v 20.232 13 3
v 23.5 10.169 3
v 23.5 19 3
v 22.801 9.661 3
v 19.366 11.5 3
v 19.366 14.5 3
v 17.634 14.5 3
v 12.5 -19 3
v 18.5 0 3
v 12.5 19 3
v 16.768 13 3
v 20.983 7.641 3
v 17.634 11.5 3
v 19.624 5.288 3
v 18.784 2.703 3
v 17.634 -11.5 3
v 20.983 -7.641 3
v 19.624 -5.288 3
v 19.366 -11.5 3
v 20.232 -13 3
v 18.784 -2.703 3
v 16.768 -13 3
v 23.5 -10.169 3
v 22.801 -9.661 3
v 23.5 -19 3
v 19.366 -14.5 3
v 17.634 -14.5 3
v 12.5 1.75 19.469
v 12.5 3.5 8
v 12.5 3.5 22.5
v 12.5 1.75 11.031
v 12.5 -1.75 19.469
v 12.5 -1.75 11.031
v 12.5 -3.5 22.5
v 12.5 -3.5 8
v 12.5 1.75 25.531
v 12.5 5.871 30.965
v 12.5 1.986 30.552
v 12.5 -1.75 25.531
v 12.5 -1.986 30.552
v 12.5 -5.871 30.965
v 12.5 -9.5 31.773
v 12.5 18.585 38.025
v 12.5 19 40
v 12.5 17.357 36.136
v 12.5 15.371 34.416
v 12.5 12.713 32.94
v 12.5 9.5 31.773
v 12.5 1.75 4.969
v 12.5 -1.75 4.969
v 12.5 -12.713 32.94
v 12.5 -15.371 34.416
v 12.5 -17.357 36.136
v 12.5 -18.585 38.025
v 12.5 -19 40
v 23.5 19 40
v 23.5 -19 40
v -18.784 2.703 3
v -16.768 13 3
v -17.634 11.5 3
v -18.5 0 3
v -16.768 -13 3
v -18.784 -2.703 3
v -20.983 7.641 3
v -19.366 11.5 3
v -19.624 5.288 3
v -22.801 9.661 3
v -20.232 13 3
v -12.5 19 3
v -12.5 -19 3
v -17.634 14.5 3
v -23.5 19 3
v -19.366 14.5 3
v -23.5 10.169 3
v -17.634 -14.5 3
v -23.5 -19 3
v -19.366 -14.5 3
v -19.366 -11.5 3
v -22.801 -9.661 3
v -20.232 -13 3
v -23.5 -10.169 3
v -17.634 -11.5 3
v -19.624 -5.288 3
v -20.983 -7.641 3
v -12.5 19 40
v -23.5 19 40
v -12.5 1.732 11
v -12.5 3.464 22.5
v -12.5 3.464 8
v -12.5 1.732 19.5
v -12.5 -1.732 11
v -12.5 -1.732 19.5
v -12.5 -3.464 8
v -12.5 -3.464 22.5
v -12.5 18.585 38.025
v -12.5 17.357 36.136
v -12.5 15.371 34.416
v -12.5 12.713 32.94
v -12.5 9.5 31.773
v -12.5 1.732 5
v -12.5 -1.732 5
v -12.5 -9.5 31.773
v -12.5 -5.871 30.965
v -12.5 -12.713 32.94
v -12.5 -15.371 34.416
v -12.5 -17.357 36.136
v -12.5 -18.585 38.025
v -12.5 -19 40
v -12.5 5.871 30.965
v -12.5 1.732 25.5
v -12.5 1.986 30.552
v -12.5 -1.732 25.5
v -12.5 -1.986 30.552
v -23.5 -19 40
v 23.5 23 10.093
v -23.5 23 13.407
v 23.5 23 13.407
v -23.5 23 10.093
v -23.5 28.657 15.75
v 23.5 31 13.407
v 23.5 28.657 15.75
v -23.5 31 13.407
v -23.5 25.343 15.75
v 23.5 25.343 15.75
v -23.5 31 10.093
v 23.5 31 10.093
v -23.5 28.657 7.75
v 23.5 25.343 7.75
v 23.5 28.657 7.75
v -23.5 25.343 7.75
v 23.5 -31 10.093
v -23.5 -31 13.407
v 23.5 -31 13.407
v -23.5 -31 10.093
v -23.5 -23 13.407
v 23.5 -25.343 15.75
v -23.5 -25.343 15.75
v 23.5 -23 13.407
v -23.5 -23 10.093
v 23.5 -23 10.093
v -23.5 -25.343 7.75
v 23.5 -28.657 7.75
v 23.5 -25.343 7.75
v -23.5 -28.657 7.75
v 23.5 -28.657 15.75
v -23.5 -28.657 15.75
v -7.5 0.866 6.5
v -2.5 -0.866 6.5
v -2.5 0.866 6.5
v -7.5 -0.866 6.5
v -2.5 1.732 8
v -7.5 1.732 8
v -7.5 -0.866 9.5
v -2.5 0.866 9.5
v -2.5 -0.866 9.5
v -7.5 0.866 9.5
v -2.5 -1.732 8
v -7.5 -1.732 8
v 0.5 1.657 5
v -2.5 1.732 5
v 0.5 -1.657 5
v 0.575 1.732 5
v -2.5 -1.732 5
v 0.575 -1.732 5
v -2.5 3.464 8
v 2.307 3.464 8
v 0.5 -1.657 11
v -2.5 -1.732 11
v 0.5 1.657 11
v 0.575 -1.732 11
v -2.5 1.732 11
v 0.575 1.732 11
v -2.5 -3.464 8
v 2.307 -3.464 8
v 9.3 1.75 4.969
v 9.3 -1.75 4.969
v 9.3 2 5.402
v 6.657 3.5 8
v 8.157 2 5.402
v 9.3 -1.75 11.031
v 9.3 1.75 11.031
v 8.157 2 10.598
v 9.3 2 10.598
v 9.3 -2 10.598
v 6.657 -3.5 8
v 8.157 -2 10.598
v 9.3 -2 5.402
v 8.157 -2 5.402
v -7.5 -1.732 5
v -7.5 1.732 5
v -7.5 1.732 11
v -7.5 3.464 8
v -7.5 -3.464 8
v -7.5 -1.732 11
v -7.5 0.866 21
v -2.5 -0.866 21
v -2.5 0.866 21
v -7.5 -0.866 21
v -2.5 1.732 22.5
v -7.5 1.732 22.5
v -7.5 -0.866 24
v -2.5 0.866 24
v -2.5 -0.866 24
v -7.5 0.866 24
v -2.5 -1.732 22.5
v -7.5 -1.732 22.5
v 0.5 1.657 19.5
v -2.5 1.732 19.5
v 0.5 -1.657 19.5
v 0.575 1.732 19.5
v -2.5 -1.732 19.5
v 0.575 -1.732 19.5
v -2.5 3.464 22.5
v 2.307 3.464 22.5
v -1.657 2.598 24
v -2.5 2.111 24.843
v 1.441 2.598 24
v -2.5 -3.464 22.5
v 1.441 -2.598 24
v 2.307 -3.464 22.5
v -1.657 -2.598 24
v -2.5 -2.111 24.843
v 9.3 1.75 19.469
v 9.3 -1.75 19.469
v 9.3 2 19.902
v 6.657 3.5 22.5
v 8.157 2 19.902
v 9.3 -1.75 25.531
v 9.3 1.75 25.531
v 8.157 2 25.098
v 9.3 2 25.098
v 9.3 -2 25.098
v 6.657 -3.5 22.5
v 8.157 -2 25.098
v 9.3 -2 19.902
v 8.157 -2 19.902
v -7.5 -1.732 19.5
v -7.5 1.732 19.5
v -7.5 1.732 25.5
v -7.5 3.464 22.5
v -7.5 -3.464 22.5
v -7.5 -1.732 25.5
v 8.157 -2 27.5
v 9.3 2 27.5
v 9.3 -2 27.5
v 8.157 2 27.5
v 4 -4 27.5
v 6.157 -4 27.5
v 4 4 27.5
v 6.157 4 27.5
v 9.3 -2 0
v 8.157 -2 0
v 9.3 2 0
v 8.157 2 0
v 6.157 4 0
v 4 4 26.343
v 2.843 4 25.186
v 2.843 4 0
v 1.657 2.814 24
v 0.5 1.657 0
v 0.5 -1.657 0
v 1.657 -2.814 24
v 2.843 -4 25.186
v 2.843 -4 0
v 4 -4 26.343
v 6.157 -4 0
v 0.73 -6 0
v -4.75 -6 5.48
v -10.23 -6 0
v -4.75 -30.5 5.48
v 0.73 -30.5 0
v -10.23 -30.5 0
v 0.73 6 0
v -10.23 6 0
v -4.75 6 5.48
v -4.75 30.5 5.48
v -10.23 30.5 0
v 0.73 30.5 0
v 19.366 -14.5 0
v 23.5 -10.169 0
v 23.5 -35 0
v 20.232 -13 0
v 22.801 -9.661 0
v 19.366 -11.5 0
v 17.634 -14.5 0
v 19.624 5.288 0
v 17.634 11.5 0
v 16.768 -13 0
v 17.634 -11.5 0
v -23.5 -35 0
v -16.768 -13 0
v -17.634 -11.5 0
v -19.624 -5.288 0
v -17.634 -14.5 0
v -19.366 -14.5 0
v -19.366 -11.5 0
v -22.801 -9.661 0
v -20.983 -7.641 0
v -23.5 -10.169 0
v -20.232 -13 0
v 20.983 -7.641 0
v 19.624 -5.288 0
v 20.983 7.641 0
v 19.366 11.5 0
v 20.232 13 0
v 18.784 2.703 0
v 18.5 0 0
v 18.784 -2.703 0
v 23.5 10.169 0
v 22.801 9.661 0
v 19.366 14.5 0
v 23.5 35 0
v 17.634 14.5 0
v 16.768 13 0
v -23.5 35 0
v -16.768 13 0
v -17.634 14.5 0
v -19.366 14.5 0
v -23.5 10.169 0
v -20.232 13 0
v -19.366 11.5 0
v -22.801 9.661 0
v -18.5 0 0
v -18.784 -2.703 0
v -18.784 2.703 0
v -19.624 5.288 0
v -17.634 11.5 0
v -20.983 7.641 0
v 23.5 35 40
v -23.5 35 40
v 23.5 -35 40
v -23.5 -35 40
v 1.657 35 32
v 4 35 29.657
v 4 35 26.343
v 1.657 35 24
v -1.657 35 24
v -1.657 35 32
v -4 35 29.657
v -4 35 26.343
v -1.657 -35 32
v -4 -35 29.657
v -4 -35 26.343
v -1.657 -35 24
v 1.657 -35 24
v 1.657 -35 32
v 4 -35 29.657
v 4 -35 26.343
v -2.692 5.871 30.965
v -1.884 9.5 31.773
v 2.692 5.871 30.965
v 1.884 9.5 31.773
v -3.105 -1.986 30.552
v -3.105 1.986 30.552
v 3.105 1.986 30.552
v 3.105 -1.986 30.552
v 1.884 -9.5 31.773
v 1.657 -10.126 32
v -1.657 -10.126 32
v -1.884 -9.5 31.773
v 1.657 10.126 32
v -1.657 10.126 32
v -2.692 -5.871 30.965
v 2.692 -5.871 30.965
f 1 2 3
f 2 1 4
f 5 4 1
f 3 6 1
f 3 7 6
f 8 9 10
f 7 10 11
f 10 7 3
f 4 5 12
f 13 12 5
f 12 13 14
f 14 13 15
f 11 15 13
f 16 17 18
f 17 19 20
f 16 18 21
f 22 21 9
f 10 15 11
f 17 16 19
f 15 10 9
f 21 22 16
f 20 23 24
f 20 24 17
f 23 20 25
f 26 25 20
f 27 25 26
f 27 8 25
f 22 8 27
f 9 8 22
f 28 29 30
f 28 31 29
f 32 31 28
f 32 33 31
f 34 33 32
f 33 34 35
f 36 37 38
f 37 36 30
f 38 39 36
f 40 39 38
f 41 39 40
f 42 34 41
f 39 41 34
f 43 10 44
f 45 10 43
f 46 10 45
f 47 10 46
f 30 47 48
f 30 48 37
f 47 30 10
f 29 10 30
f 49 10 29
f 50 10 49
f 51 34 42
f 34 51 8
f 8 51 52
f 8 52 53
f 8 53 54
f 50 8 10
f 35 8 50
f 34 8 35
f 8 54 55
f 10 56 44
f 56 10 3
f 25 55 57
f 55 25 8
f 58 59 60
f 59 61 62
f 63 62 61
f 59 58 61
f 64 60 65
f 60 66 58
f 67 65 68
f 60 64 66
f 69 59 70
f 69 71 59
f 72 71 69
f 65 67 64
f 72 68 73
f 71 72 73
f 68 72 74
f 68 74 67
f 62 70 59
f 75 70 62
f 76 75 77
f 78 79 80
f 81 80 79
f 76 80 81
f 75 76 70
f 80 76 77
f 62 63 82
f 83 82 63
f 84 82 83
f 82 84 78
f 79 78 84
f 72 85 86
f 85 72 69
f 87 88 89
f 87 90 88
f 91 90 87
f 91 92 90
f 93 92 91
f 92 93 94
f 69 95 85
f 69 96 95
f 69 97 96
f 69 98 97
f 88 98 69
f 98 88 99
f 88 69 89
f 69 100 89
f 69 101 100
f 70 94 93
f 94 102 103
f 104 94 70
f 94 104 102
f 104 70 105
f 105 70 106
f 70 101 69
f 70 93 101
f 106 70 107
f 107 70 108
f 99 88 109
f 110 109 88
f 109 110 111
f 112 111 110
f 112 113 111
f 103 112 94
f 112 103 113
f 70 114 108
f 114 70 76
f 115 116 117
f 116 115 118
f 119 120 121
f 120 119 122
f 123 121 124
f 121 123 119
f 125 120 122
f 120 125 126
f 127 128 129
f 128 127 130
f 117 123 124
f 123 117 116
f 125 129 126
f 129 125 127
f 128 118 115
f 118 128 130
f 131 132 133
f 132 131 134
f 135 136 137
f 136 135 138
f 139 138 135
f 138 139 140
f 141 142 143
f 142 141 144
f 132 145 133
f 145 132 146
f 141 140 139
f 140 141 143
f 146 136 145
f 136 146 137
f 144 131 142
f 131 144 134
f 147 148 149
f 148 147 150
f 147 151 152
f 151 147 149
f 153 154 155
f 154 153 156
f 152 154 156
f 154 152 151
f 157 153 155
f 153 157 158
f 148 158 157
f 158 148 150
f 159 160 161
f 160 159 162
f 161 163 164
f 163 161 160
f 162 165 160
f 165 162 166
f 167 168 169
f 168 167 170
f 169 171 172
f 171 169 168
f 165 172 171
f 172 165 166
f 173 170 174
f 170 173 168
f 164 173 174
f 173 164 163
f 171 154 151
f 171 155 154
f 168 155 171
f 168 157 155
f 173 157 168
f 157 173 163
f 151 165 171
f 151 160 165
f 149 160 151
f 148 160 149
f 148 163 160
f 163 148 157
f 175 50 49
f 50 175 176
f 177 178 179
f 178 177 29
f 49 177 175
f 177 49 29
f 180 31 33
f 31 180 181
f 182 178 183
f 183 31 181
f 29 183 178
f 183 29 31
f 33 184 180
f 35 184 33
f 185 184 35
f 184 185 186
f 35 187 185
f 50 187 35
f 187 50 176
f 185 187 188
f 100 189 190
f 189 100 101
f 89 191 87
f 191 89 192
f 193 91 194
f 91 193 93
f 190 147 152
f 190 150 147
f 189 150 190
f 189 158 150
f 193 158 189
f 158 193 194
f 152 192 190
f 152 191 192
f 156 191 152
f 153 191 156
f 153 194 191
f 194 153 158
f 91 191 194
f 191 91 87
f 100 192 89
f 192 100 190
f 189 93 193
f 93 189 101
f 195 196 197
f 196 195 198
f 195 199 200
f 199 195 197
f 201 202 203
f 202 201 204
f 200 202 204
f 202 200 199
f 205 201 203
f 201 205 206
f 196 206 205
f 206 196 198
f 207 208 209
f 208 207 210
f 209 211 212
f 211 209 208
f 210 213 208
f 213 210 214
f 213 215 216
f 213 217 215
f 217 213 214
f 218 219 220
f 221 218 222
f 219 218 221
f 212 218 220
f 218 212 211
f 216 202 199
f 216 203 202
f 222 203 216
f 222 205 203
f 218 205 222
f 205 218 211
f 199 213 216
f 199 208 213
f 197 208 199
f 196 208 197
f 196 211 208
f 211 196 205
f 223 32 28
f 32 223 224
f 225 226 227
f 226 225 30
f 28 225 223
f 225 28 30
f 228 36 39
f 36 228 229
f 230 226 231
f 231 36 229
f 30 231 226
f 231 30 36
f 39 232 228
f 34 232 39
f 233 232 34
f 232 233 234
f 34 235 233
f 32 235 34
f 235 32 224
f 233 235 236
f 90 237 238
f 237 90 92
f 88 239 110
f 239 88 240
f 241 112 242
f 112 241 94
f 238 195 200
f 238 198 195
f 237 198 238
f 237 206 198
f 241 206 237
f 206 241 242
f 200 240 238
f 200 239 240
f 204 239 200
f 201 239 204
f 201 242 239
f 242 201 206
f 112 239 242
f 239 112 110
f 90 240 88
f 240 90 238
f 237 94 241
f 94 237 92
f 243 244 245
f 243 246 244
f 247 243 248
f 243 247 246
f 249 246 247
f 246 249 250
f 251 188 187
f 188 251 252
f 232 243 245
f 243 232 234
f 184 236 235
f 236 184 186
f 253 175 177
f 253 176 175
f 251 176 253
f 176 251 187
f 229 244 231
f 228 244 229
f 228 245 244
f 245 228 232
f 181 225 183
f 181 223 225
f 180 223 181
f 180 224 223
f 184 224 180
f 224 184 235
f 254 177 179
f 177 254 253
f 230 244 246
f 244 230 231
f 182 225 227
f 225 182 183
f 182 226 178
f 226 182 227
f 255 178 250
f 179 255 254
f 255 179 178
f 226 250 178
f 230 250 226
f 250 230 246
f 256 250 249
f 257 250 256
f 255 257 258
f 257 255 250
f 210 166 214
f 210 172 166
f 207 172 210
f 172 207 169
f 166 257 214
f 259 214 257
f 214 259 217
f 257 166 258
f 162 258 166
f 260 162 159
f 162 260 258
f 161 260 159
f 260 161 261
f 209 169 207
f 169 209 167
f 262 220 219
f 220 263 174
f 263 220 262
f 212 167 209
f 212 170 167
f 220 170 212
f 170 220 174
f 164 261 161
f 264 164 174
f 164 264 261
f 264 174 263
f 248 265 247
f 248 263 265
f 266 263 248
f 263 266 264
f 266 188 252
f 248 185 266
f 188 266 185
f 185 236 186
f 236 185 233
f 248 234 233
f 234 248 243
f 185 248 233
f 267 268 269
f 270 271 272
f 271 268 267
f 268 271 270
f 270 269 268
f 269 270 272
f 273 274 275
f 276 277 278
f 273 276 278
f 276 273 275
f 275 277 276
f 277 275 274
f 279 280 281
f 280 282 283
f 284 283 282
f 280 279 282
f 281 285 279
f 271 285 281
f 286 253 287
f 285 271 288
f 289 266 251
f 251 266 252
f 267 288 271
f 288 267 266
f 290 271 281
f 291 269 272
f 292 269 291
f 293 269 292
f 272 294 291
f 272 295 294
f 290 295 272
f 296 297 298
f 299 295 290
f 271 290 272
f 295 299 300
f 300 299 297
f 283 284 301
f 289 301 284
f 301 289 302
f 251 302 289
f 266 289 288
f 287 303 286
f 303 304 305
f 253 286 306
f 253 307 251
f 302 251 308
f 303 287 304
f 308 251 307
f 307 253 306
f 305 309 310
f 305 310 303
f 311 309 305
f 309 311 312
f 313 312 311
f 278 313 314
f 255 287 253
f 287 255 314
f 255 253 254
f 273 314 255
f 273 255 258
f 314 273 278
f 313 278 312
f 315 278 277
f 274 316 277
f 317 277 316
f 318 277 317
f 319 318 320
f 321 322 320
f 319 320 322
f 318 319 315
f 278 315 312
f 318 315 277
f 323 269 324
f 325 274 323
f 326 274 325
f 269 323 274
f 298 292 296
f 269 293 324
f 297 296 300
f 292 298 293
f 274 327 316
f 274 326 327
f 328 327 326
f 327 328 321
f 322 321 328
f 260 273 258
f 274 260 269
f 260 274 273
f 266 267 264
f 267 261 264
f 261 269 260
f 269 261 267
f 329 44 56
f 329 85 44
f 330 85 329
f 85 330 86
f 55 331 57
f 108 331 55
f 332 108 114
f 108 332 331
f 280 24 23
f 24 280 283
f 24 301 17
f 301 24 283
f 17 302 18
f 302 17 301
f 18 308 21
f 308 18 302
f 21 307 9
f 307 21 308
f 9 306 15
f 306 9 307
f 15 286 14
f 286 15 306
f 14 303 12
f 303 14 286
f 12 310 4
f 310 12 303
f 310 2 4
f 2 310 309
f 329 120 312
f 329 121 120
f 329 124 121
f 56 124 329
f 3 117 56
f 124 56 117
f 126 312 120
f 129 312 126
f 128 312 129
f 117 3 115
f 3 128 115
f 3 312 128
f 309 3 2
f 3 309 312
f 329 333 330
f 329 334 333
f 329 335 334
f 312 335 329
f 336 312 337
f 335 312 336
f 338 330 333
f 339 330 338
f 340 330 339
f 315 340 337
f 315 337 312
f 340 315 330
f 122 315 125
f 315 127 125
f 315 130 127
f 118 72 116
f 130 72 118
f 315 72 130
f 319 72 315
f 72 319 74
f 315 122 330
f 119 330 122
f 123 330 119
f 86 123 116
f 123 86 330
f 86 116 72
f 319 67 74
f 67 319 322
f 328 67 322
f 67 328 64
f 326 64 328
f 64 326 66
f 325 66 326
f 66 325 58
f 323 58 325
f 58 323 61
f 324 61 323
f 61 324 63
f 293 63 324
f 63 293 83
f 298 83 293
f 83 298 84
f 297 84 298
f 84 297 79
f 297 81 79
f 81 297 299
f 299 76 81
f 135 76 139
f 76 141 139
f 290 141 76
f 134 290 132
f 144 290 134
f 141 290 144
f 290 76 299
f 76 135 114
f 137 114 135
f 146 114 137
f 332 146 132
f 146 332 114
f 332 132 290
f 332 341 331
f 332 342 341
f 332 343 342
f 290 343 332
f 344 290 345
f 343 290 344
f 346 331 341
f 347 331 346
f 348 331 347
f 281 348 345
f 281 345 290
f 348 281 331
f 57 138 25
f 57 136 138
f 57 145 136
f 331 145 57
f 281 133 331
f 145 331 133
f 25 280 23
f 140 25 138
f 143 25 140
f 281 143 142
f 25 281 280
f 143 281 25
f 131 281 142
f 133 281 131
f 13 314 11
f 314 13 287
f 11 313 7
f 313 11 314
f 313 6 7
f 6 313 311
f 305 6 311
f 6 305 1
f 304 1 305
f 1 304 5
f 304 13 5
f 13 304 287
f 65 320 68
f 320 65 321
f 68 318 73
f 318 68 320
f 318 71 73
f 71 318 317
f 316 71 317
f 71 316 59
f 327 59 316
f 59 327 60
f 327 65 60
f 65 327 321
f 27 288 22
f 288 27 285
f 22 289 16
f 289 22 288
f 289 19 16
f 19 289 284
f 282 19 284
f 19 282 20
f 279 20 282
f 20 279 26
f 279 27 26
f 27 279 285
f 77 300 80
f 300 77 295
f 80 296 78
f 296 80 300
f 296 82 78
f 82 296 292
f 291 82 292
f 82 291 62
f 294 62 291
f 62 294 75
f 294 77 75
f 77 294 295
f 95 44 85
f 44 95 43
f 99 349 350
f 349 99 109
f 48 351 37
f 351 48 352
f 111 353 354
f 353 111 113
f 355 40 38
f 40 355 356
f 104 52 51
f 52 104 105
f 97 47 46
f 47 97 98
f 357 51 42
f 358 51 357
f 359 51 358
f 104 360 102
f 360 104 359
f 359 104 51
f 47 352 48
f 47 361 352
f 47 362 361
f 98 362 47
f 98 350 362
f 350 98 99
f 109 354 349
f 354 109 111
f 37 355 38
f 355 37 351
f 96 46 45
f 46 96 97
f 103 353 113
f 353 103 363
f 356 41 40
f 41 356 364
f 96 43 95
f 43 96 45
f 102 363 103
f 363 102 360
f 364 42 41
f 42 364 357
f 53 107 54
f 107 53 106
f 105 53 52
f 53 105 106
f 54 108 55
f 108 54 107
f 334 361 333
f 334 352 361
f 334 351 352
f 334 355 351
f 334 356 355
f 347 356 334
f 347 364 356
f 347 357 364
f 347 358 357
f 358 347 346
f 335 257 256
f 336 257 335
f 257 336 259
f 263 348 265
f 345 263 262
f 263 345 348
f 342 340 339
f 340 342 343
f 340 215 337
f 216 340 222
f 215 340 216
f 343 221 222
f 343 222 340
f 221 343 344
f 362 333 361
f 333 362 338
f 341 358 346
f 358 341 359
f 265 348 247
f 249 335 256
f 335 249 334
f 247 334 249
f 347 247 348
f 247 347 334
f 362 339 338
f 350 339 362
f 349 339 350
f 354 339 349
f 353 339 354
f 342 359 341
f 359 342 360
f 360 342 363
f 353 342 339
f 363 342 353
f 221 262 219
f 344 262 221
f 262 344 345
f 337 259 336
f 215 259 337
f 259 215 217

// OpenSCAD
// file: settings.scad
rod_size = 8;
rod_nut_size = 15; //12 for M6, 15 for M8
bearing_size = 15.5; //12.5 for LM6UU, 15.5 for LM8UU,LM8SUU
bearing_length = 24.5; //19.5 for LM6UU, 17.5 for LM8SUU, 24.5 for LM8UU
yz_motor_distance = 25;
motor_screw_spacing = 26; //26 for NEMA14, 31 for NEMA17
motor_casing = 38; //38 for NEMA14, 45 for NEMA17
end_height = 40; //measure the height of your motor casing and add 4mm. Suggestion: 40 for NEMA14, 55 for NEMA17
bed_mount_height = 16;
//x_rod_spacing = motor_screw_spacing + 3 + rod_size;
x_rod_spacing = 30;
x_carriage_width = 70;
carriage_extruder_offset = 5;
pulley_size = 20;
idler_pulley_width = 10;
gusset_size = 15;
m3_size = 3;
m3_nut_size = 6;
m4_size = 4;
motor_shaft_size = 5;

// ratio for converting diameter to apothem
da6 = 1 / cos(180 / 6) / 2;
da8 = 1 / cos(180 / 8) / 2;
// main file
include <settings.scad>;

!base_end();

module base_end() difference() {
	linear_extrude(height = end_height, convexity = 5) difference() {
		square([yz_motor_distance + motor_casing - motor_screw_spacing + 10, motor_casing + rod_size * 4], center = true);
		for(end = [1, -1]) {
			for(side = [1, -1]) translate([end * (yz_motor_distance + motor_casing - motor_screw_spacing) / 2, side * motor_screw_spacing / 2, 0]) circle(m3_size * da6, $fn = 6);
			translate([end * (yz_motor_distance + motor_casing) / 2, 0, 0]) circle(motor_screw_spacing / 2);
		}
	}
	for(end = [1, -1]) translate([end * (yz_motor_distance + motor_casing) / 2, 0, 3]) linear_extrude(height = end_height, convexity = 5) square(motor_casing, center = true);
	for(side = [1, -1]) translate([0, side * (motor_casing / 2 + rod_size), rod_size / 2 + bearing_size / 2]) rotate([90, 180 / 8, 90]) {
		cylinder(r = rod_size * da8, h = yz_motor_distance + motor_casing + 20, center = true, $fn = 8);
		%translate([0, 0, -70]) cylinder(r = rod_size * da8, h = 200, center = true, $fn = 8);
	}
	translate([0, 0, end_height]) scale([1, 1, .5]) rotate([90, 0, 90]) cylinder(r = motor_casing / 2, h = yz_motor_distance + 20, center = true);
	translate([yz_motor_distance / 2 - rod_size, 0, 0]) {
		translate([0, 0, -3]) linear_extrude(height = end_height - motor_casing / 4, convexity = 5) {
			rotate(180 / 8) circle(rod_size * da8, $fn = 8);
			translate([0, -rod_size / 4, 0]) square([rod_size * .6, rod_size / 2]);
		}
		// z axis clamping
		for(h = [8, end_height - motor_casing / 4 - 8]) translate([0, 0, h]) rotate([90, 0, 90]) {
			cylinder(r = m3_size * da6, h = yz_motor_distance + motor_casing, center = true, $fn = 6);
			translate([0, 0, -rod_size / 2 - 3]) cylinder(r = m3_nut_size* da6, h = yz_motor_distance + motor_casing, $fn = 6);
			translate([0, 0, 0]) cylinder(r = m3_nut_size / 2 + 0.5, h = yz_motor_distance + motor_casing, $fn = 6);
			translate([0, 0, -rod_size / 2 - 8]) rotate([0, 180, 0]) cylinder(r = m3_size * da6 * 2, h = yz_motor_distance + motor_casing, $fn = 6);
		}
	}
	translate([-yz_motor_distance / 2 + bearing_size / 2, 0, -bearing_size * sqrt(2) / 4]) rotate([90, -45, 0]) {
		%cylinder(r = rod_size * da8, h = 100, center = true, $fn = 8);
		for(side = [0, 1]) mirror([0, 0, side]) translate([0, 0, rod_size / 2 + 2]) {
			cylinder(r = bearing_size / 2, h = bearing_length, center = false, $fn = 80);
			cube([bearing_size / 2, bearing_size / 2, bearing_length]);
		}
	}
	translate([0, 0, end_height - rod_size * 1.5]) rotate([90, 180 / 8, 0]) cylinder(r = rod_size * da8, h = motor_casing + rod_size * 5, $fn = 8, center = true);
	%translate([0, 0, end_height - rod_size * 1.5]) rotate([90, 180 / 8, 0]) cylinder(r = rod_size * da8, h = 100, $fn = 8, center = true);
}
